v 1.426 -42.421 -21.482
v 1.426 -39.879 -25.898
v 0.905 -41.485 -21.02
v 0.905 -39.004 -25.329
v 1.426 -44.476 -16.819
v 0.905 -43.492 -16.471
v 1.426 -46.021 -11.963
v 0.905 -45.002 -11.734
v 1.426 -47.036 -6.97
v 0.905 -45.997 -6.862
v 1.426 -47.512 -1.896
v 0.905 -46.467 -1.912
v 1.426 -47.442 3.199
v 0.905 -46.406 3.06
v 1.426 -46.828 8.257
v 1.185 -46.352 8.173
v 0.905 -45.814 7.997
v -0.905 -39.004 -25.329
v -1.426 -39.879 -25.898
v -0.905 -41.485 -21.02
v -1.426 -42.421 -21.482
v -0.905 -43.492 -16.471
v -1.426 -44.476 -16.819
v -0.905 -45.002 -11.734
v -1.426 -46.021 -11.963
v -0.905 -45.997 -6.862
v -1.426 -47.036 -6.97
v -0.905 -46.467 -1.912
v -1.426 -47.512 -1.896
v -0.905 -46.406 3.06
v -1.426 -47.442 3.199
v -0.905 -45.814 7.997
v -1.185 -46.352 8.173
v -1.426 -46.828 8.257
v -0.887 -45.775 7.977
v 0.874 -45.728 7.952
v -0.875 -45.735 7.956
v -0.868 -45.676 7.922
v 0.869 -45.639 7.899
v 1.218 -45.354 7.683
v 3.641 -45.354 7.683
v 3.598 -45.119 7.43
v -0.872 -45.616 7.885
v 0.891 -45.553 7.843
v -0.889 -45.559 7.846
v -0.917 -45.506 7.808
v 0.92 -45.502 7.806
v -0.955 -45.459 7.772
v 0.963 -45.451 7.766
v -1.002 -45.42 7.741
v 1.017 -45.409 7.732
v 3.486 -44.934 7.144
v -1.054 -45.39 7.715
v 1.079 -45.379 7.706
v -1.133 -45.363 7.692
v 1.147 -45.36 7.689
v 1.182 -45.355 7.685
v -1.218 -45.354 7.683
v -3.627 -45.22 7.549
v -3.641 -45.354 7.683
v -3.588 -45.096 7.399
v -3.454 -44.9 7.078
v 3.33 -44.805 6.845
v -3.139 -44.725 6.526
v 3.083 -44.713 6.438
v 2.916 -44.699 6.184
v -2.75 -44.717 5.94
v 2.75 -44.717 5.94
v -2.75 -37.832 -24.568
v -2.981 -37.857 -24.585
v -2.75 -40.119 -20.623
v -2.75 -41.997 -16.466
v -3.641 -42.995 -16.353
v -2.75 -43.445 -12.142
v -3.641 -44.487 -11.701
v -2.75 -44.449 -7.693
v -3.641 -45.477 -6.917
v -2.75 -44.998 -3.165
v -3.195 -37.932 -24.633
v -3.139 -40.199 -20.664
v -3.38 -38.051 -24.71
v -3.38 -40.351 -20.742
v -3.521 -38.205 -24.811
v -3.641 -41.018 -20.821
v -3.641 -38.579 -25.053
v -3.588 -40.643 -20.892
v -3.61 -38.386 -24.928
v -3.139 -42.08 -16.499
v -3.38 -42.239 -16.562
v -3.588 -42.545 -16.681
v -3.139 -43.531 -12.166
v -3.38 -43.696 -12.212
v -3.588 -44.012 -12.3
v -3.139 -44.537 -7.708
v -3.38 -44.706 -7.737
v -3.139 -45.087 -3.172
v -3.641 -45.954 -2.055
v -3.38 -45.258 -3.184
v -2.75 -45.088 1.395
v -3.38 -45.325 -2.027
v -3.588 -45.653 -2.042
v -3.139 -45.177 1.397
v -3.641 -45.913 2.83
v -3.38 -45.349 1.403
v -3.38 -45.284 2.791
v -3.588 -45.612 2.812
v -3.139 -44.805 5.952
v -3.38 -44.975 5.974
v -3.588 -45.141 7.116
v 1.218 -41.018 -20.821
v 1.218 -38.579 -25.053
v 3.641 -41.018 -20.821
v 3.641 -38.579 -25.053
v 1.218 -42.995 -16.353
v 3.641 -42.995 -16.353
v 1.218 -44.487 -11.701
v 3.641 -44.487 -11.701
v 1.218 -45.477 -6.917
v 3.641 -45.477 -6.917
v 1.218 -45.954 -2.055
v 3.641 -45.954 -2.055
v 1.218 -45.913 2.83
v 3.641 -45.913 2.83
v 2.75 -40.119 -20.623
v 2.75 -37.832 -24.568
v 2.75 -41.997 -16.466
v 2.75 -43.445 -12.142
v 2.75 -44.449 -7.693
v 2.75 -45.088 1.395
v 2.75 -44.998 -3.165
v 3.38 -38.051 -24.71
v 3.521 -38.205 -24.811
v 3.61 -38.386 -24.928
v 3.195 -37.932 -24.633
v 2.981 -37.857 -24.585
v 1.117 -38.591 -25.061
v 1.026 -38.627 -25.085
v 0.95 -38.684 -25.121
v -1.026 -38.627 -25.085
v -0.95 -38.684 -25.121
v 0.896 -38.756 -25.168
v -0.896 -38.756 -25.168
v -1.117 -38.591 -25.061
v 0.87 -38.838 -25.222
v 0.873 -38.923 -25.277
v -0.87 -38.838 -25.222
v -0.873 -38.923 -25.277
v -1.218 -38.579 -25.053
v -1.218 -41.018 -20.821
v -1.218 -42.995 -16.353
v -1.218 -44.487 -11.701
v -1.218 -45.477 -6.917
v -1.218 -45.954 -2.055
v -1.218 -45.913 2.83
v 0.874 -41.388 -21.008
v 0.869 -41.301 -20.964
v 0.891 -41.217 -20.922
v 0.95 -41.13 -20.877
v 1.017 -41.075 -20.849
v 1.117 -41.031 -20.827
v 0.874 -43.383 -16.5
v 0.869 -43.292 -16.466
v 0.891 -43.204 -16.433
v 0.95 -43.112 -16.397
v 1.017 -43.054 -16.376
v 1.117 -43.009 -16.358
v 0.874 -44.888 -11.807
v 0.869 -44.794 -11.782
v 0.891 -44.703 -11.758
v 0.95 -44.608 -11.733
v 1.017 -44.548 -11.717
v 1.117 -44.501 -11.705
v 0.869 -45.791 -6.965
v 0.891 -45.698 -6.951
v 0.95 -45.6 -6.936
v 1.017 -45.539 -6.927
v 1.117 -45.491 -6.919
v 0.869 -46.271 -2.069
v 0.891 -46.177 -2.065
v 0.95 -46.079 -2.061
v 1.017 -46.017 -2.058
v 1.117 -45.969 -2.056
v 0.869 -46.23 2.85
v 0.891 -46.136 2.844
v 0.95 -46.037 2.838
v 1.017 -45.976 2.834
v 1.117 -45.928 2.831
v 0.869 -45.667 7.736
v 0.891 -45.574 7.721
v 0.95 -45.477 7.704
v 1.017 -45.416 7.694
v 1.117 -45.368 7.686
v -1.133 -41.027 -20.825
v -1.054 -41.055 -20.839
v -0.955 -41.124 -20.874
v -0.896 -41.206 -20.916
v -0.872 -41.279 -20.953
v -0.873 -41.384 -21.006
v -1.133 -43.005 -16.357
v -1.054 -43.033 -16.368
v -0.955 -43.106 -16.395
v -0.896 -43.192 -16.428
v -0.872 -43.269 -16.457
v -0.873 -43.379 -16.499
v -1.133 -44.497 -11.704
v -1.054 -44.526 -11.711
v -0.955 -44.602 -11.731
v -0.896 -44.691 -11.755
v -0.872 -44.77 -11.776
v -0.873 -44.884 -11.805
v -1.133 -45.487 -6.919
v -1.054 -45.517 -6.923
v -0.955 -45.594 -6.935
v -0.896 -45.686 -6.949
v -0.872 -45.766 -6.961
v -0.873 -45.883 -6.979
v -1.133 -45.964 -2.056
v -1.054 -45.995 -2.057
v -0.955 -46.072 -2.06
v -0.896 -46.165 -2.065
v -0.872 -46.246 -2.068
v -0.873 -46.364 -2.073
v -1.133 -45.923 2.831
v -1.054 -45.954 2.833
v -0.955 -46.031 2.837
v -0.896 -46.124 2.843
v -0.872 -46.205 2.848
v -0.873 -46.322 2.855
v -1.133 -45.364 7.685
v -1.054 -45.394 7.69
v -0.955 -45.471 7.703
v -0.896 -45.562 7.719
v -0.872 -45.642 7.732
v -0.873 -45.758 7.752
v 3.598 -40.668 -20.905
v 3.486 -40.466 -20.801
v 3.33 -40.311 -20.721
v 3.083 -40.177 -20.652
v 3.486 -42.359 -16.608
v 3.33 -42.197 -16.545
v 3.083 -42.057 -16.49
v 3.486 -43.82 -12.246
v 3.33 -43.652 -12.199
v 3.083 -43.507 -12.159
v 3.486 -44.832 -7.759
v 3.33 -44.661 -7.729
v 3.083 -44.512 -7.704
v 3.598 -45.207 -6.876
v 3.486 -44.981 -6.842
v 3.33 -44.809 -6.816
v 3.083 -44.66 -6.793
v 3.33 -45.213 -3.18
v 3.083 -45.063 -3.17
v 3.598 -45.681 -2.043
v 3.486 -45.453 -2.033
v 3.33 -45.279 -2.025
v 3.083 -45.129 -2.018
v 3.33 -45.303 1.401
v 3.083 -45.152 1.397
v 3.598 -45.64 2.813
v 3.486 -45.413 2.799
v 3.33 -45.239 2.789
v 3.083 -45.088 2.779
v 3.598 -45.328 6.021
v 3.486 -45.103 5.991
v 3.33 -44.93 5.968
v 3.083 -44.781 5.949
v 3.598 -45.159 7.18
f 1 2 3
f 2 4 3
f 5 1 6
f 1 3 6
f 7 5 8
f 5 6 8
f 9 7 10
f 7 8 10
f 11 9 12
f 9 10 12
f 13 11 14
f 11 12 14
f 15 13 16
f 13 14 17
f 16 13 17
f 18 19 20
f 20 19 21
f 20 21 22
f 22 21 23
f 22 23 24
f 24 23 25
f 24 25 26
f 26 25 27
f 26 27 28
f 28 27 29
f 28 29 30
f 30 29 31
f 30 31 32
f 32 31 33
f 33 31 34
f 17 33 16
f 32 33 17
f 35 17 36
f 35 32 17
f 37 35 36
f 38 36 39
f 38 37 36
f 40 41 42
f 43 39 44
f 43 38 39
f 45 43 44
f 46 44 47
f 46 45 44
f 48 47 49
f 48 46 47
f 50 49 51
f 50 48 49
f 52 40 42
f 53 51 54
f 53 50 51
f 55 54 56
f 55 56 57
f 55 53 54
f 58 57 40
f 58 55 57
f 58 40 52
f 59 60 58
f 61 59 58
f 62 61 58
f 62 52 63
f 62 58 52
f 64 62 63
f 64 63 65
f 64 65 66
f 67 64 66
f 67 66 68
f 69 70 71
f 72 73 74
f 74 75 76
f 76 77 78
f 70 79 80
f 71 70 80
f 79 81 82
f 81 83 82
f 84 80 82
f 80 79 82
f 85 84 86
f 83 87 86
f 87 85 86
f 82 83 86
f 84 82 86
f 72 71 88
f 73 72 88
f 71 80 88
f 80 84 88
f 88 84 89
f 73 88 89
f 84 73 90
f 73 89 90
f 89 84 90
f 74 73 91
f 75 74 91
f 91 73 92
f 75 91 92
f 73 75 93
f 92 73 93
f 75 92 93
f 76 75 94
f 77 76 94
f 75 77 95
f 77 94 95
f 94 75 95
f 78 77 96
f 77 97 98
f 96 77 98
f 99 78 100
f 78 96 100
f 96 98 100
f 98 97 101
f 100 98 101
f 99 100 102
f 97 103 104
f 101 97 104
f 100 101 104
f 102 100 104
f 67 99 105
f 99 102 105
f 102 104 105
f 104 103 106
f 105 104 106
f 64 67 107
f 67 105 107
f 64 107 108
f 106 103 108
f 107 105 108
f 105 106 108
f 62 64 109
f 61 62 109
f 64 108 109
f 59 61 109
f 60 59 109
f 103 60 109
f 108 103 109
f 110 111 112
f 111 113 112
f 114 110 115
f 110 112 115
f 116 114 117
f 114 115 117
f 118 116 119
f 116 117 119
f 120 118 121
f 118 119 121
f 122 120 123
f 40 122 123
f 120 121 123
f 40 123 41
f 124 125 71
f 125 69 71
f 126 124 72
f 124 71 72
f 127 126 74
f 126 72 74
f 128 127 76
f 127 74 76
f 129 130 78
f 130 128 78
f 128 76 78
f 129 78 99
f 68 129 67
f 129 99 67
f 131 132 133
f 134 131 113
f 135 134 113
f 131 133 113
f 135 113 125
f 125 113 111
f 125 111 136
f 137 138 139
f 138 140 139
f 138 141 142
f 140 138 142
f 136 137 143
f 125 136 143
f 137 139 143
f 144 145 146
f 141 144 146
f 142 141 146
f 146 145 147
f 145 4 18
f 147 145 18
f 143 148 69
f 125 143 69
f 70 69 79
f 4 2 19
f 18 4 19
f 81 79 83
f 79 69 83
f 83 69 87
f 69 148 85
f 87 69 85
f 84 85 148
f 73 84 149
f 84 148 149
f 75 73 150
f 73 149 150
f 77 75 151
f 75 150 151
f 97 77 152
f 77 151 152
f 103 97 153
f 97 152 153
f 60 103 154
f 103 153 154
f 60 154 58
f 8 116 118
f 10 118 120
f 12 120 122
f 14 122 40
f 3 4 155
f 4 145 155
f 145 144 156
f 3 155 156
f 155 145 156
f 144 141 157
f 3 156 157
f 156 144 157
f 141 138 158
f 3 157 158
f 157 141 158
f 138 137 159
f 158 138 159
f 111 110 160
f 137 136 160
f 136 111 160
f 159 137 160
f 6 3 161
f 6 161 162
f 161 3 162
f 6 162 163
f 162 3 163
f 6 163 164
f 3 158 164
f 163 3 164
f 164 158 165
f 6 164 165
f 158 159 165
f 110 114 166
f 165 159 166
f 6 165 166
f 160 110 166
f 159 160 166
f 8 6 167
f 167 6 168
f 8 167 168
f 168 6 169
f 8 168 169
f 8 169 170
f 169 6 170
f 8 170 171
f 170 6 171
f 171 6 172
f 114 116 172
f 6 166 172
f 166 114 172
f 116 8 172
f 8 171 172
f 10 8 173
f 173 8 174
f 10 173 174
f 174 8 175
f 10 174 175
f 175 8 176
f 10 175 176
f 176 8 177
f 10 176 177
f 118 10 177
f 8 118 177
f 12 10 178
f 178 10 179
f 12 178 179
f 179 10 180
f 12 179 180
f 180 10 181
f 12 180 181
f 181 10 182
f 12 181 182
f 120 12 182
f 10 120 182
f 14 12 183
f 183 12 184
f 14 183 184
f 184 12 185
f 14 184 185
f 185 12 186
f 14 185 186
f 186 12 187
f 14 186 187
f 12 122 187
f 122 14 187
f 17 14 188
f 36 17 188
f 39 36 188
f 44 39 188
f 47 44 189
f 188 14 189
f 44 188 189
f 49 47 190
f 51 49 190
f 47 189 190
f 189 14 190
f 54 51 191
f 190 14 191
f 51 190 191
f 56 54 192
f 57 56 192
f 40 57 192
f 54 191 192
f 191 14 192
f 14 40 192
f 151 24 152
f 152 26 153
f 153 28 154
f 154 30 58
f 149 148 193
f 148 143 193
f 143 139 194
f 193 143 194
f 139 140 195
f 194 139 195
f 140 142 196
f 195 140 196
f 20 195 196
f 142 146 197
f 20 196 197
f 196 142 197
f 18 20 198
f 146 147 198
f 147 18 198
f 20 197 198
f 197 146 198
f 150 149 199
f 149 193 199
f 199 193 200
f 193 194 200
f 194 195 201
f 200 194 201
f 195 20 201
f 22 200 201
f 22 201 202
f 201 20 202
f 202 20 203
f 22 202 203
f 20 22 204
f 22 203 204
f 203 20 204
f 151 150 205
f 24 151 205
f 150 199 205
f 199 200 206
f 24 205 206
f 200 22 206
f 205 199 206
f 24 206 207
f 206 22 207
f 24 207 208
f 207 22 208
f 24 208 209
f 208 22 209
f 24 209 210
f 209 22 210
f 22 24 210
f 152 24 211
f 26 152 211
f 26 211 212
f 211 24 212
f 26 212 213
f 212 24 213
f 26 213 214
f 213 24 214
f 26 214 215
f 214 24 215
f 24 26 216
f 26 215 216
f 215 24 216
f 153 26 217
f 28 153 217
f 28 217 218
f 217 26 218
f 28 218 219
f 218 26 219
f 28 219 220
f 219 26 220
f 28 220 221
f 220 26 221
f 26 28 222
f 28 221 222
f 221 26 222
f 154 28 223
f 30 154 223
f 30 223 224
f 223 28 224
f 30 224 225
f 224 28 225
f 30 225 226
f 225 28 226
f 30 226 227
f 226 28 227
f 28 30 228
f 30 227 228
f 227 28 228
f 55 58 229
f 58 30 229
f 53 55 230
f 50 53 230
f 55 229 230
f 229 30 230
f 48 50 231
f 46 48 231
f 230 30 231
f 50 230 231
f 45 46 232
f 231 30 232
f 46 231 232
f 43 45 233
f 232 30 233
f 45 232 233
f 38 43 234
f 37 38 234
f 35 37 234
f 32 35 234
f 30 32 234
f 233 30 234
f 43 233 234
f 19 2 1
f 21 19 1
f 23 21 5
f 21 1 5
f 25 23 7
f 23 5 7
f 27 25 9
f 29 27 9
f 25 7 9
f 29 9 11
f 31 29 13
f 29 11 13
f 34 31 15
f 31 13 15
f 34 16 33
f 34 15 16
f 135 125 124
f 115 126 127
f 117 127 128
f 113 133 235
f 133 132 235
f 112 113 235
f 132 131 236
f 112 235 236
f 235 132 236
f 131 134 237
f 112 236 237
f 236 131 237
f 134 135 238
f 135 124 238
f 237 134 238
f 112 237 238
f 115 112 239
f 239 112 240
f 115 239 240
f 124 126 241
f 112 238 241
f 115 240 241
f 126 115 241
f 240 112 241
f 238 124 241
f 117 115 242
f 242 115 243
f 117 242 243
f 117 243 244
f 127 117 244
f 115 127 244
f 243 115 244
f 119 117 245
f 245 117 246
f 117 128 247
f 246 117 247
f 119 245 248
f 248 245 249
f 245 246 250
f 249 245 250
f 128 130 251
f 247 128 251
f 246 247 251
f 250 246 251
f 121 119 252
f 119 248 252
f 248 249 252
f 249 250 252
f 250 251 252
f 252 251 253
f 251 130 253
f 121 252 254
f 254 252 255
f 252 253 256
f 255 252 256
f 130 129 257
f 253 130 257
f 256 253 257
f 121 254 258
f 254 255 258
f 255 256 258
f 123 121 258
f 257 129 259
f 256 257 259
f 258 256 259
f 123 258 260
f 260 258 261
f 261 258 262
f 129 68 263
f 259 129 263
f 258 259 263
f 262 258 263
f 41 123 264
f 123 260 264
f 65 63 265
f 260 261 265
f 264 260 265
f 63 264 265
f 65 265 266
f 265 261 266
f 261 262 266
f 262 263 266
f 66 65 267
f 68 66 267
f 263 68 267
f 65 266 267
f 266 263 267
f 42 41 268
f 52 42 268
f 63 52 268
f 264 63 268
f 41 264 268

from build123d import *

# Parameters (mm, degrees)
REVOLVE1_ANGLE           = 33
REVOLVE1_OTHER_WAY_ANGLE = 10
FILLET1_START            = -5
FILLET1_DEPTH            = 10


with BuildPart() as part:
    # Sketch1 → Revolve1 (revolve)
    with BuildSketch(Plane(origin=(0, 0, 0), x_dir=(1, 0, 0), z_dir=(0, 0, -1))):
        with BuildLine():
            Line((-3.640625, 46), (-1.217705098, 46))
            ThreePointArc((-1.217705098, 46), (-0.919977315, 46.165994111), (-0.904655581, 46.506524758))
            Line((-0.904655581, 46.506524758), (-1.426393202, 47.55))
            Line((-1.426393202, 47.55), (1.426393202, 47.55))
            Line((1.426393202, 47.55), (0.904655581, 46.506524758))
            ThreePointArc((0.904655581, 46.506524758), (0.919977315, 46.165994111), (1.217705098, 46))
            Line((1.217705098, 46), (3.640625, 46))
            ThreePointArc((3.640625, 46), (3.379766977, 45.370233023), (2.75, 45.109375))
            Line((2.75, 45.109375), (-2.75, 45.109375))
            ThreePointArc((-2.75, 45.109375), (-3.379766977, 45.370233023), (-3.640625, 46))
        make_face()
    revolve(axis=Axis((0, 0, 0), (1, 0, 0)), revolution_arc=REVOLVE1_ANGLE)

    # Sketch1 → Revolve1 other way (revolve)
    with BuildSketch(Plane(origin=(0, 0, 0), x_dir=(1, 0, 0), z_dir=(0, 0, -1))):
        with BuildLine():
            Line((-3.640625, 46), (-1.217705098, 46))
            ThreePointArc((-1.217705098, 46), (-0.919977315, 46.165994111), (-0.904655581, 46.506524758))
            Line((-0.904655581, 46.506524758), (-1.426393202, 47.55))
            Line((-1.426393202, 47.55), (1.426393202, 47.55))
            Line((1.426393202, 47.55), (0.904655581, 46.506524758))
            ThreePointArc((0.904655581, 46.506524758), (0.919977315, 46.165994111), (1.217705098, 46))
            Line((1.217705098, 46), (3.640625, 46))
            ThreePointArc((3.640625, 46), (3.379766977, 45.370233023), (2.75, 45.109375))
            Line((2.75, 45.109375), (-2.75, 45.109375))
            ThreePointArc((-2.75, 45.109375), (-3.379766977, 45.370233023), (-3.640625, 46))
        make_face()
    revolve(axis=Axis((0, 0, 0), (-1, 0, 0)), revolution_arc=REVOLVE1_OTHER_WAY_ANGLE)

    # Fillet1: read off the stored shape, not the designer's step
    # Fillet1 outline → Fillet1 (cut)
    with BuildSketch(Plane.YZ.offset(FILLET1_START)):
        with BuildLine():
            ThreePointArc((-46.351849466, 8.173081667), (-45.085567377, 7.385144883), (-44.716561853, 5.94010176))
            ThreePointArc((-44.716561853, 5.94010176), (-44.580361526, 6.888184024), (-44.424062234, 7.833160764))
            Line((-44.424062234, 7.833160764), (-46.351849466, 8.173081667))
        make_face()
    extrude(amount=FILLET1_DEPTH, mode=Mode.SUBTRACT)


solid = part.part
